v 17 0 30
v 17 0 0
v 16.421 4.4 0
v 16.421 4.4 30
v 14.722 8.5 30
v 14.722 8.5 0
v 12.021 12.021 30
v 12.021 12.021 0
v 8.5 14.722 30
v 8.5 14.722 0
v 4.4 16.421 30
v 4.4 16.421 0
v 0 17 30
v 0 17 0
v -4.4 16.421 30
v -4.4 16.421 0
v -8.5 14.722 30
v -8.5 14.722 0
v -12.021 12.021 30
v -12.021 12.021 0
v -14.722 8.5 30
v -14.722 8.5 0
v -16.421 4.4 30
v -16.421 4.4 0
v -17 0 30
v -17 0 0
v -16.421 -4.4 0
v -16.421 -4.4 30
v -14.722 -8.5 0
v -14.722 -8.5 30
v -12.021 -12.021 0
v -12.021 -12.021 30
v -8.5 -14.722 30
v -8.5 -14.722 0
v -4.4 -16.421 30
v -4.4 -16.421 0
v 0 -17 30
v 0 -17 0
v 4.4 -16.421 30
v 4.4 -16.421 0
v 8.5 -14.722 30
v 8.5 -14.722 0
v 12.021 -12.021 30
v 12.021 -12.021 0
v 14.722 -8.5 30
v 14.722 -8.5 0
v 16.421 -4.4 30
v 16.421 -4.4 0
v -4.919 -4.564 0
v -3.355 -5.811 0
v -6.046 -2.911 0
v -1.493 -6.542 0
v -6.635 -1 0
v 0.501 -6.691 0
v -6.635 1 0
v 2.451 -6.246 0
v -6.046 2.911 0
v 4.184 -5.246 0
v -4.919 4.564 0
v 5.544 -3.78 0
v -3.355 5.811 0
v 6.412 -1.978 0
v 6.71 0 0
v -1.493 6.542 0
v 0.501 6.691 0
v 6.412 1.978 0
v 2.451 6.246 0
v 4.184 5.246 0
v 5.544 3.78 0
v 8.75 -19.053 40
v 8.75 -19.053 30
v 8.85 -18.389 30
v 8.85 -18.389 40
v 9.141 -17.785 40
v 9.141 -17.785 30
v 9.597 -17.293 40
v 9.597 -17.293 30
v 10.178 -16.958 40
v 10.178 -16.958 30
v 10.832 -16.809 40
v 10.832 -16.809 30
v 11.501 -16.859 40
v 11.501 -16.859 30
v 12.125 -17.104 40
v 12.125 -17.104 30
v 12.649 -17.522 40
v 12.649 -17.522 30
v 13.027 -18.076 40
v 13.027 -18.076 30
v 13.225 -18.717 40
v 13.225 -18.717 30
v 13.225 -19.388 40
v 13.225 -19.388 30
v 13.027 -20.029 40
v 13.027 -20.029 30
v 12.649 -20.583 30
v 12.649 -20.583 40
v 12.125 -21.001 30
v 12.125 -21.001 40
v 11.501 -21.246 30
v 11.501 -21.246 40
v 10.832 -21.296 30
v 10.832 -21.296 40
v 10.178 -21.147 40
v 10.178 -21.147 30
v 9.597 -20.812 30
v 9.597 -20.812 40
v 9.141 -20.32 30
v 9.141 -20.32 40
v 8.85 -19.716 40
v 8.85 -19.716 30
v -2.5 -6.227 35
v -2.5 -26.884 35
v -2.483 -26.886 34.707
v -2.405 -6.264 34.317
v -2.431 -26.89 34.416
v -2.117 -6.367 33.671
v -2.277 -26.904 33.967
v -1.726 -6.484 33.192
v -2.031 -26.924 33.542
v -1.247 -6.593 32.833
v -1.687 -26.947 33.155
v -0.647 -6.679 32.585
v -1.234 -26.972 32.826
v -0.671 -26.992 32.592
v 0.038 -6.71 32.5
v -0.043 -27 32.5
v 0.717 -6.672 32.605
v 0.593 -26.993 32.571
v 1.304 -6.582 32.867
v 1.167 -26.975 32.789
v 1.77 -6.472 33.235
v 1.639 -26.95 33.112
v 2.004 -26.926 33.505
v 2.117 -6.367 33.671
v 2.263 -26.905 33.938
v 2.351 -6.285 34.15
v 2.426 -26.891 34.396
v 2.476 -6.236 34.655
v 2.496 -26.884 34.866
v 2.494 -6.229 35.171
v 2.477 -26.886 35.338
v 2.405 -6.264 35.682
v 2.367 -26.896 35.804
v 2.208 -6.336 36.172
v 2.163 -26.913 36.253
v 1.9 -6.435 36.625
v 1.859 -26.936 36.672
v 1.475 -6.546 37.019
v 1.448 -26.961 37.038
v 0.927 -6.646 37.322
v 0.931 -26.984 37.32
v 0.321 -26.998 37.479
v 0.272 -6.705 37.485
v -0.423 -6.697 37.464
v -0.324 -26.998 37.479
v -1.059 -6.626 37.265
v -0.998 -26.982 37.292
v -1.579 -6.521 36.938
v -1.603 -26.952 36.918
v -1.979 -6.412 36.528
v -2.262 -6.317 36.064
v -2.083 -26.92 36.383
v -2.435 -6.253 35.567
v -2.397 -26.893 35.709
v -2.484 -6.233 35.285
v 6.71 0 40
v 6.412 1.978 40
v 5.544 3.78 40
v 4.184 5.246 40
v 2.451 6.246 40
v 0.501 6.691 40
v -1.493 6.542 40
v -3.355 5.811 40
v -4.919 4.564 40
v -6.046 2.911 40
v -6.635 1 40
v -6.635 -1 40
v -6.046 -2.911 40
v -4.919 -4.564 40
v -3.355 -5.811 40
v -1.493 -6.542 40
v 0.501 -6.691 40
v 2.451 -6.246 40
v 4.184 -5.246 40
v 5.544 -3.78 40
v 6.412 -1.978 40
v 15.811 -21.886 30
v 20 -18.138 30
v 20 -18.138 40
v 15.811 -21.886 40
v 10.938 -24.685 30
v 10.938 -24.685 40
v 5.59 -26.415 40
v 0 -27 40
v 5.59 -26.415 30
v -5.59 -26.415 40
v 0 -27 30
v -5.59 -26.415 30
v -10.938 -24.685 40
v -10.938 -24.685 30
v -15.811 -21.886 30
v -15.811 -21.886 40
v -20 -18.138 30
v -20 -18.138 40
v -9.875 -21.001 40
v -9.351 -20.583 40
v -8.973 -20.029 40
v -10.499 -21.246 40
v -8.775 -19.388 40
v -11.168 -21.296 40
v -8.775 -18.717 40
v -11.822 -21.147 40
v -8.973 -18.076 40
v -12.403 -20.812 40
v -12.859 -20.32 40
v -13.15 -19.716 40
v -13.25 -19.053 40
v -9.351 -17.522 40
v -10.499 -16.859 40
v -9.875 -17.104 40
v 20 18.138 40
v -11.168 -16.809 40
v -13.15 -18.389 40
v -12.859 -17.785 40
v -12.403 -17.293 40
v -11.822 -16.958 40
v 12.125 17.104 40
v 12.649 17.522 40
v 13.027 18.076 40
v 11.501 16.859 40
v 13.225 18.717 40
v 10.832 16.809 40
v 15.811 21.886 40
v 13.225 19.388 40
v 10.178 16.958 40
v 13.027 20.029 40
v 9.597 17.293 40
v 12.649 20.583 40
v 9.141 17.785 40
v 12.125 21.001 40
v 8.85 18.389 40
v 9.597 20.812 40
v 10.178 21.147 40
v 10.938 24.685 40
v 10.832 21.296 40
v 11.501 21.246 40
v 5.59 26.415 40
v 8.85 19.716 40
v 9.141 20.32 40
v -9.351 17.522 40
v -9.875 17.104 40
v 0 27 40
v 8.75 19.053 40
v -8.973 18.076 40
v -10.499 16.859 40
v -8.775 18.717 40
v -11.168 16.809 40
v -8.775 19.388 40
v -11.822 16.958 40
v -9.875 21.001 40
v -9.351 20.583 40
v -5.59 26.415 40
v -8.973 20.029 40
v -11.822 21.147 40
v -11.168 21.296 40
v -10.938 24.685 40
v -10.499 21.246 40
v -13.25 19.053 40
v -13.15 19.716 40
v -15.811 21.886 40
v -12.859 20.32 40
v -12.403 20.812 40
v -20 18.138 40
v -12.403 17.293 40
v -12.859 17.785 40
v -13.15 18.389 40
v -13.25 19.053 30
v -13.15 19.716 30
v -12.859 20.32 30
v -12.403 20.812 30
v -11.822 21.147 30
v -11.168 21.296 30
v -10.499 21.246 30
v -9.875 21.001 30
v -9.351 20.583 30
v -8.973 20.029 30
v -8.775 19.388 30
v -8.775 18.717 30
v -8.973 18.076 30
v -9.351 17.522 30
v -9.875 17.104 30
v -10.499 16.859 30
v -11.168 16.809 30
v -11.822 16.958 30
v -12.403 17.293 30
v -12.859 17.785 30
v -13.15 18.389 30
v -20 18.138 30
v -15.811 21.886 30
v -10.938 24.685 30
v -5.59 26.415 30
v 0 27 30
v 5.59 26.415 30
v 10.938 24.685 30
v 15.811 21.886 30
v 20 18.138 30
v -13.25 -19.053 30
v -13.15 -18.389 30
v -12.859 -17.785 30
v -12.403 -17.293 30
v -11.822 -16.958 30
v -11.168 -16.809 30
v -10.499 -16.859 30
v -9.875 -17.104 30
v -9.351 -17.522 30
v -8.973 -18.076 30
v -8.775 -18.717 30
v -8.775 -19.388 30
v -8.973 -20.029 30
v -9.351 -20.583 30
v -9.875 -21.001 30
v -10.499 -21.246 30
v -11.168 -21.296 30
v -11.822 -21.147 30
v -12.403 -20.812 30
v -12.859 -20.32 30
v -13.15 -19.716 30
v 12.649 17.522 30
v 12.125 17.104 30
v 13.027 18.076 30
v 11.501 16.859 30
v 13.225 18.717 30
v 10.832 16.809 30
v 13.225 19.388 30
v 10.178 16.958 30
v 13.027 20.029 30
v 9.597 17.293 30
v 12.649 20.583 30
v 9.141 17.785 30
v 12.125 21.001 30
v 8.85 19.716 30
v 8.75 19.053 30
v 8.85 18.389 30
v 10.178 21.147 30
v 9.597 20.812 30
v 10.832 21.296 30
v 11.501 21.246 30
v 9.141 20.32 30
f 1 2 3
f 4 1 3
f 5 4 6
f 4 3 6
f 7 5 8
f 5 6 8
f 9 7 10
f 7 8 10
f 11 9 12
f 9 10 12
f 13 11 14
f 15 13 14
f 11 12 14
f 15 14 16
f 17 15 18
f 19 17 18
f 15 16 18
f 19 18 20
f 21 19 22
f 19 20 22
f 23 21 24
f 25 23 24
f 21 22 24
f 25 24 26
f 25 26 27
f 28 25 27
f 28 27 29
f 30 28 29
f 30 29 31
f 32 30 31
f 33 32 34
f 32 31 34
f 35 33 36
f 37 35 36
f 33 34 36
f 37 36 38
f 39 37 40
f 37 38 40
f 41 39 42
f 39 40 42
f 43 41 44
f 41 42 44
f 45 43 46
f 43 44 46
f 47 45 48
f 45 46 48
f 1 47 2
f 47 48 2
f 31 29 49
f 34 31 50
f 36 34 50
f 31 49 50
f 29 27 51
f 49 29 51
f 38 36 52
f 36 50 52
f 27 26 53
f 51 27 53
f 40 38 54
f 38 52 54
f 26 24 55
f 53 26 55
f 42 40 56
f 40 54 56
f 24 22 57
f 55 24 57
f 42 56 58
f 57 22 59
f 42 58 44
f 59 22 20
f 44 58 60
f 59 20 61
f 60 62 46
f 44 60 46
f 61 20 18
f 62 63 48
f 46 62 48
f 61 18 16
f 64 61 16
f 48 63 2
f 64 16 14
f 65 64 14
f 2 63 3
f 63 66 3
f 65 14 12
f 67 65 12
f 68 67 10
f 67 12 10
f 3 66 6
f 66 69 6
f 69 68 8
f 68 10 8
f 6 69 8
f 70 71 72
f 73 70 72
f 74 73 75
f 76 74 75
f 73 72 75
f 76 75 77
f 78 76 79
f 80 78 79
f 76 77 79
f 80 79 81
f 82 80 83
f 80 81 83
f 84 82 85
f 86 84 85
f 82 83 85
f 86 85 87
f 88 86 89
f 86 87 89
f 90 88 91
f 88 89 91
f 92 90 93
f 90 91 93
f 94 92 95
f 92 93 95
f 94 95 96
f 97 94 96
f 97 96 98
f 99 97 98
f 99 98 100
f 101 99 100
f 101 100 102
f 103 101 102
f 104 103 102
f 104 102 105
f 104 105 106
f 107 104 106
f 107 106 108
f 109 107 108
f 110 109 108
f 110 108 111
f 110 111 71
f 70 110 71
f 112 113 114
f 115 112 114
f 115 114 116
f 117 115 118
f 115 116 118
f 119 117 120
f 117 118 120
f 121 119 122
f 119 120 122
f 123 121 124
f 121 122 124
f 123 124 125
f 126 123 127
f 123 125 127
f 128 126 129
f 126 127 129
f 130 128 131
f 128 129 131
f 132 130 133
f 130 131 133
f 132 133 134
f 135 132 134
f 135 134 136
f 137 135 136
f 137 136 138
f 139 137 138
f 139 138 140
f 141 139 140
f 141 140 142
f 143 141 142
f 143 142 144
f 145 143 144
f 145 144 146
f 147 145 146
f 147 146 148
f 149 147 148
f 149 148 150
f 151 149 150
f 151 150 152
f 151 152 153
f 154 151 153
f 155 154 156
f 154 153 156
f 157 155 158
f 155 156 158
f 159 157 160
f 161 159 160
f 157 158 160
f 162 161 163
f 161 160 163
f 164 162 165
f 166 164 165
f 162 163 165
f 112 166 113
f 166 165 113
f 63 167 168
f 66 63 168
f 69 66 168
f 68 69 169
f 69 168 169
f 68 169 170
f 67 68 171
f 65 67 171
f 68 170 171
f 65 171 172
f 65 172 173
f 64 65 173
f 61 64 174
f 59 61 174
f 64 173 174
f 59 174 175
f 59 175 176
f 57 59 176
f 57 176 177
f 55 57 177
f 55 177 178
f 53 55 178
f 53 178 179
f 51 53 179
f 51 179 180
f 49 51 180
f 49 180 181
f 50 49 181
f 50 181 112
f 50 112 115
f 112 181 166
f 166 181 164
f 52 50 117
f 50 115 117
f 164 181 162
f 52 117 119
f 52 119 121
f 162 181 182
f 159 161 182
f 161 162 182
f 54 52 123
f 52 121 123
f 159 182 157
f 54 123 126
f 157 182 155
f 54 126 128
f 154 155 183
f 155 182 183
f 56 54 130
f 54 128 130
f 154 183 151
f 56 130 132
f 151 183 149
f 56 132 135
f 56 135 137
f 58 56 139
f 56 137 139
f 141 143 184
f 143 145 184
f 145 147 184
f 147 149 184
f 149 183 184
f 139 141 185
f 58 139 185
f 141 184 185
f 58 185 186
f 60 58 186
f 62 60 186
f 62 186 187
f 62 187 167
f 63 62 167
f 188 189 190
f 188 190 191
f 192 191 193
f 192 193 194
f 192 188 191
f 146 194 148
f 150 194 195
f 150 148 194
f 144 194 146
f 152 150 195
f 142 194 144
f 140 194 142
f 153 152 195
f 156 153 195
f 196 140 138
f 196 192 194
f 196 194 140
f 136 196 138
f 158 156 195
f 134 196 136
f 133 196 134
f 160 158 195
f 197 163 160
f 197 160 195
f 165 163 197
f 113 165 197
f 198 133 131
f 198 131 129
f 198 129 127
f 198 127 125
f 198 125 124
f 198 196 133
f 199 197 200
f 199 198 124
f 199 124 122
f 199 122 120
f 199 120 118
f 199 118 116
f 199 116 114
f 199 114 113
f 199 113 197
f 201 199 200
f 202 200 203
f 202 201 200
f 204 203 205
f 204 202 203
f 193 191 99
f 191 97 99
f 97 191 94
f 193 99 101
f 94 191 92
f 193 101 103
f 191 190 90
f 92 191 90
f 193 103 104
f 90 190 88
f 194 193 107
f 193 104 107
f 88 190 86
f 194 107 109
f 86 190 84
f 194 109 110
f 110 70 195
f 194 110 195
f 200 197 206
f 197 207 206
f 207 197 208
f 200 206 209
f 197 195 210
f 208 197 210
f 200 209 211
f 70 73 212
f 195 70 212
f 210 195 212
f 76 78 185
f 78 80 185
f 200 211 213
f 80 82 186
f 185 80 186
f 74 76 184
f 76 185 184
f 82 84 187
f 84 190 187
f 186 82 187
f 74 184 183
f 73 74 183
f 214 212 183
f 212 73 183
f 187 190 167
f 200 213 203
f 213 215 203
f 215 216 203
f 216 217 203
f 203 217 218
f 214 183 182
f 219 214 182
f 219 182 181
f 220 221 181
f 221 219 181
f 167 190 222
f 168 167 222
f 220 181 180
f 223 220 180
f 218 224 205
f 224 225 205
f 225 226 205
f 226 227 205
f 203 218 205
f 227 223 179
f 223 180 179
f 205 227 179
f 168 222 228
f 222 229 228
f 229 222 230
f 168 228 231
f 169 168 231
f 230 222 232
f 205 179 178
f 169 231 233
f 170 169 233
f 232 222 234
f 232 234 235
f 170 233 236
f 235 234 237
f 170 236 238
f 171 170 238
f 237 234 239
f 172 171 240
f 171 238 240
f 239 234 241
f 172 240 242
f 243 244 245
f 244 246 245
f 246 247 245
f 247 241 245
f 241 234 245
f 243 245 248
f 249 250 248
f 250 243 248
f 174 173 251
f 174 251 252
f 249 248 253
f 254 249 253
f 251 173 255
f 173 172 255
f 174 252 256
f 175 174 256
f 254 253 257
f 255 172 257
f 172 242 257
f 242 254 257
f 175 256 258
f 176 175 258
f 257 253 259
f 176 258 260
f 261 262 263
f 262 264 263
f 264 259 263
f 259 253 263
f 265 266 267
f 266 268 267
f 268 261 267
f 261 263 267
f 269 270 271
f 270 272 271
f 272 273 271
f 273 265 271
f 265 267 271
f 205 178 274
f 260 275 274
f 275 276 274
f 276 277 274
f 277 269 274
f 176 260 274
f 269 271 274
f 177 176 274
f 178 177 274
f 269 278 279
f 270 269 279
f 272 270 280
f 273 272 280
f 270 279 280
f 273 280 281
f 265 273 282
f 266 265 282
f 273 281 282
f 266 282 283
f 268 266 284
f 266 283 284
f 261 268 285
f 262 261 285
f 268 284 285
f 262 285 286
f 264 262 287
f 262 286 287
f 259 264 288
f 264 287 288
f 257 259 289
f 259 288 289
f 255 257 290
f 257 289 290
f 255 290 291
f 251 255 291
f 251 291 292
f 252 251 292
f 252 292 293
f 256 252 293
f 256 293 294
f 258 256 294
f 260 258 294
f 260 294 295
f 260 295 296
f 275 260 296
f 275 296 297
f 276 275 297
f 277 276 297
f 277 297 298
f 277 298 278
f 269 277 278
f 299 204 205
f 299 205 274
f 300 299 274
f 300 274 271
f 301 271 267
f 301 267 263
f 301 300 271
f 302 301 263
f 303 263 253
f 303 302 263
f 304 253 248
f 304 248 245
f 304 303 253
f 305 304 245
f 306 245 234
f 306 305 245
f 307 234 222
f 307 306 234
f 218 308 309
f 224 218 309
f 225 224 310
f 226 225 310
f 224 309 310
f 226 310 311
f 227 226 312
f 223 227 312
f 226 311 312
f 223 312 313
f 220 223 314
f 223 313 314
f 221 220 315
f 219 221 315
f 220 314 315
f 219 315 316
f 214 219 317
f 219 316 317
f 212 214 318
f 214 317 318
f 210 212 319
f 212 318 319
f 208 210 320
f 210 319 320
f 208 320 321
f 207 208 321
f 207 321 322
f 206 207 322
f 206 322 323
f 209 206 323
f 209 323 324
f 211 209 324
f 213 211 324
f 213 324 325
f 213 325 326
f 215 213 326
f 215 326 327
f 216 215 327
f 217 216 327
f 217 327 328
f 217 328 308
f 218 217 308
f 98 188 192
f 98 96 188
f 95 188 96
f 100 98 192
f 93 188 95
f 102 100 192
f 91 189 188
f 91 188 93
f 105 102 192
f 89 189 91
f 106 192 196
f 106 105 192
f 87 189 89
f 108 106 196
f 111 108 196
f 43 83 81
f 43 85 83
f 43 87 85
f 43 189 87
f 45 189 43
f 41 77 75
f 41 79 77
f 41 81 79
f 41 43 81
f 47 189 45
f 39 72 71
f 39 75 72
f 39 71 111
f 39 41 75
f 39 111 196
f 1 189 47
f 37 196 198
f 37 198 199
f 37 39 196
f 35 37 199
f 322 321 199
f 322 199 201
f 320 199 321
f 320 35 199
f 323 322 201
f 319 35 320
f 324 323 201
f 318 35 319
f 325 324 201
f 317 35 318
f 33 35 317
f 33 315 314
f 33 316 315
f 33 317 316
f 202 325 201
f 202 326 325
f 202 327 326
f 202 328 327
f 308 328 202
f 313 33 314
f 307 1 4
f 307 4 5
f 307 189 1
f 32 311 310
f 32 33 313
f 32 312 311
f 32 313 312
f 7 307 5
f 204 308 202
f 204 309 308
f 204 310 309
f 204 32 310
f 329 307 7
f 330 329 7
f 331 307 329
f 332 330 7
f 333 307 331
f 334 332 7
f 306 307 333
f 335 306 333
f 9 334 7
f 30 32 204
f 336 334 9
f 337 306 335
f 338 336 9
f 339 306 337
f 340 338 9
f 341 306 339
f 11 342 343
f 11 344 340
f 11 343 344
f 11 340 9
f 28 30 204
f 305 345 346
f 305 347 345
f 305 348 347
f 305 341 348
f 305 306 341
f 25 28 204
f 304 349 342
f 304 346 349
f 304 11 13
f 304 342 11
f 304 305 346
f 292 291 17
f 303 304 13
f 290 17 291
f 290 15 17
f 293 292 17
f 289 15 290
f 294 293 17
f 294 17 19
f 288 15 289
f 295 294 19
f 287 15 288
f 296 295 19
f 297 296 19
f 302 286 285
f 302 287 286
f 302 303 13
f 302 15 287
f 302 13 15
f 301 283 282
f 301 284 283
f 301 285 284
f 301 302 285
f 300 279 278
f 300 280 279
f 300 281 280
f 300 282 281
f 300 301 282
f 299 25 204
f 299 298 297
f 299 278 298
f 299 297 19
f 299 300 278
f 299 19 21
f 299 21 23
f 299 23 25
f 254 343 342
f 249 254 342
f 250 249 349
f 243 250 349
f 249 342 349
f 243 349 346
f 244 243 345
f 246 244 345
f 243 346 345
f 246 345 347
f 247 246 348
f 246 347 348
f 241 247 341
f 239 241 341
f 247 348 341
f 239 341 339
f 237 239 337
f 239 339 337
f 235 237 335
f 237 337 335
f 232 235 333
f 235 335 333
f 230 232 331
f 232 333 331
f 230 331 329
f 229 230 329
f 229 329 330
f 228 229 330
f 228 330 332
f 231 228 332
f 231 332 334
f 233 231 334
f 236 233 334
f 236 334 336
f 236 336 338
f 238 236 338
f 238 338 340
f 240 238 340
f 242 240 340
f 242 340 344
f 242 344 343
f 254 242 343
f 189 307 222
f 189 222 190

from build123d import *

# Parameters (mm, degrees)
SKETCH1_R                        = 17
BOSS_EXTRUDE1_DEPTH              = 30
BOSS_EXTRUDE2_DEPTH              = 10
SKETCH4_R                        = 6.71
CUT_EXTRUDE1_DEPTH               = 53.239831546
TAP_DRILL_FOR_M6X1_0_TAP1_REACH  = 72.114
TAP_DRILL_FOR_M6X1_0_TAP1_BORE_R = 2.5
F_4_5_4_5_DIAMETER_HOLE1_D       = 4.5


with BuildPart() as part:
    # Sketch1 → Boss-Extrude1 (new body)
    with BuildSketch(Plane.XY):
        Circle(SKETCH1_R)
    extrude(amount=BOSS_EXTRUDE1_DEPTH)

    # Sketch3 → Boss-Extrude2 (add)
    with BuildSketch(Plane.XY.offset(30)):
        with BuildLine():
            Line((-20, -18.138357147), (-20, 18.138357147))
            ThreePointArc((-20, 18.138357147), (0, 27), (20, 18.138357147))
            Line((20, 18.138357147), (20, -18.138357147))
            ThreePointArc((20, -18.138357147), (0, -27), (-20, -18.138357147))
        make_face()
    extrude(amount=BOSS_EXTRUDE2_DEPTH)

    # Sketch4 → Cut-Extrude1 (cut, through all)
    with BuildSketch(Plane.XY.offset(40)):
        Circle(SKETCH4_R)
    extrude(amount=-CUT_EXTRUDE1_DEPTH, mode=Mode.SUBTRACT)

    # Tap Drill for M6x1.0 Tap1 bore → Tap Drill for M6x1.0 Tap1 (cut, up to next)
    with BuildSketch(Plane(origin=(0, -27, 0), x_dir=(-1, 0, 0), z_dir=(0, -1, 0)), mode=Mode.PRIVATE) as tap_drill_for_m6x1_0_tap1_sk1:
        with Locations((0, -35)):
            Circle(TAP_DRILL_FOR_M6X1_0_TAP1_BORE_R)
    tap_drill_for_m6x1_0_tap1_tool1 = extrude(tap_drill_for_m6x1_0_tap1_sk1.sketch, amount=-TAP_DRILL_FOR_M6X1_0_TAP1_REACH, mode=Mode.PRIVATE) & part.part
    add(tap_drill_for_m6x1_0_tap1_tool1.solids().sort_by_distance((0, -27, 35))[0], mode=Mode.SUBTRACT)

    # Ø4.5 (4.5) Diameter Hole1 (through all)
    with Locations(Plane.XY.offset(40)):
        with Locations((-11, -19.052558883), (-11, 19.052558883), (11, 19.052558883), (11, -19.052558883)):
            Hole(F_4_5_4_5_DIAMETER_HOLE1_D / 2)


solid = part.part
